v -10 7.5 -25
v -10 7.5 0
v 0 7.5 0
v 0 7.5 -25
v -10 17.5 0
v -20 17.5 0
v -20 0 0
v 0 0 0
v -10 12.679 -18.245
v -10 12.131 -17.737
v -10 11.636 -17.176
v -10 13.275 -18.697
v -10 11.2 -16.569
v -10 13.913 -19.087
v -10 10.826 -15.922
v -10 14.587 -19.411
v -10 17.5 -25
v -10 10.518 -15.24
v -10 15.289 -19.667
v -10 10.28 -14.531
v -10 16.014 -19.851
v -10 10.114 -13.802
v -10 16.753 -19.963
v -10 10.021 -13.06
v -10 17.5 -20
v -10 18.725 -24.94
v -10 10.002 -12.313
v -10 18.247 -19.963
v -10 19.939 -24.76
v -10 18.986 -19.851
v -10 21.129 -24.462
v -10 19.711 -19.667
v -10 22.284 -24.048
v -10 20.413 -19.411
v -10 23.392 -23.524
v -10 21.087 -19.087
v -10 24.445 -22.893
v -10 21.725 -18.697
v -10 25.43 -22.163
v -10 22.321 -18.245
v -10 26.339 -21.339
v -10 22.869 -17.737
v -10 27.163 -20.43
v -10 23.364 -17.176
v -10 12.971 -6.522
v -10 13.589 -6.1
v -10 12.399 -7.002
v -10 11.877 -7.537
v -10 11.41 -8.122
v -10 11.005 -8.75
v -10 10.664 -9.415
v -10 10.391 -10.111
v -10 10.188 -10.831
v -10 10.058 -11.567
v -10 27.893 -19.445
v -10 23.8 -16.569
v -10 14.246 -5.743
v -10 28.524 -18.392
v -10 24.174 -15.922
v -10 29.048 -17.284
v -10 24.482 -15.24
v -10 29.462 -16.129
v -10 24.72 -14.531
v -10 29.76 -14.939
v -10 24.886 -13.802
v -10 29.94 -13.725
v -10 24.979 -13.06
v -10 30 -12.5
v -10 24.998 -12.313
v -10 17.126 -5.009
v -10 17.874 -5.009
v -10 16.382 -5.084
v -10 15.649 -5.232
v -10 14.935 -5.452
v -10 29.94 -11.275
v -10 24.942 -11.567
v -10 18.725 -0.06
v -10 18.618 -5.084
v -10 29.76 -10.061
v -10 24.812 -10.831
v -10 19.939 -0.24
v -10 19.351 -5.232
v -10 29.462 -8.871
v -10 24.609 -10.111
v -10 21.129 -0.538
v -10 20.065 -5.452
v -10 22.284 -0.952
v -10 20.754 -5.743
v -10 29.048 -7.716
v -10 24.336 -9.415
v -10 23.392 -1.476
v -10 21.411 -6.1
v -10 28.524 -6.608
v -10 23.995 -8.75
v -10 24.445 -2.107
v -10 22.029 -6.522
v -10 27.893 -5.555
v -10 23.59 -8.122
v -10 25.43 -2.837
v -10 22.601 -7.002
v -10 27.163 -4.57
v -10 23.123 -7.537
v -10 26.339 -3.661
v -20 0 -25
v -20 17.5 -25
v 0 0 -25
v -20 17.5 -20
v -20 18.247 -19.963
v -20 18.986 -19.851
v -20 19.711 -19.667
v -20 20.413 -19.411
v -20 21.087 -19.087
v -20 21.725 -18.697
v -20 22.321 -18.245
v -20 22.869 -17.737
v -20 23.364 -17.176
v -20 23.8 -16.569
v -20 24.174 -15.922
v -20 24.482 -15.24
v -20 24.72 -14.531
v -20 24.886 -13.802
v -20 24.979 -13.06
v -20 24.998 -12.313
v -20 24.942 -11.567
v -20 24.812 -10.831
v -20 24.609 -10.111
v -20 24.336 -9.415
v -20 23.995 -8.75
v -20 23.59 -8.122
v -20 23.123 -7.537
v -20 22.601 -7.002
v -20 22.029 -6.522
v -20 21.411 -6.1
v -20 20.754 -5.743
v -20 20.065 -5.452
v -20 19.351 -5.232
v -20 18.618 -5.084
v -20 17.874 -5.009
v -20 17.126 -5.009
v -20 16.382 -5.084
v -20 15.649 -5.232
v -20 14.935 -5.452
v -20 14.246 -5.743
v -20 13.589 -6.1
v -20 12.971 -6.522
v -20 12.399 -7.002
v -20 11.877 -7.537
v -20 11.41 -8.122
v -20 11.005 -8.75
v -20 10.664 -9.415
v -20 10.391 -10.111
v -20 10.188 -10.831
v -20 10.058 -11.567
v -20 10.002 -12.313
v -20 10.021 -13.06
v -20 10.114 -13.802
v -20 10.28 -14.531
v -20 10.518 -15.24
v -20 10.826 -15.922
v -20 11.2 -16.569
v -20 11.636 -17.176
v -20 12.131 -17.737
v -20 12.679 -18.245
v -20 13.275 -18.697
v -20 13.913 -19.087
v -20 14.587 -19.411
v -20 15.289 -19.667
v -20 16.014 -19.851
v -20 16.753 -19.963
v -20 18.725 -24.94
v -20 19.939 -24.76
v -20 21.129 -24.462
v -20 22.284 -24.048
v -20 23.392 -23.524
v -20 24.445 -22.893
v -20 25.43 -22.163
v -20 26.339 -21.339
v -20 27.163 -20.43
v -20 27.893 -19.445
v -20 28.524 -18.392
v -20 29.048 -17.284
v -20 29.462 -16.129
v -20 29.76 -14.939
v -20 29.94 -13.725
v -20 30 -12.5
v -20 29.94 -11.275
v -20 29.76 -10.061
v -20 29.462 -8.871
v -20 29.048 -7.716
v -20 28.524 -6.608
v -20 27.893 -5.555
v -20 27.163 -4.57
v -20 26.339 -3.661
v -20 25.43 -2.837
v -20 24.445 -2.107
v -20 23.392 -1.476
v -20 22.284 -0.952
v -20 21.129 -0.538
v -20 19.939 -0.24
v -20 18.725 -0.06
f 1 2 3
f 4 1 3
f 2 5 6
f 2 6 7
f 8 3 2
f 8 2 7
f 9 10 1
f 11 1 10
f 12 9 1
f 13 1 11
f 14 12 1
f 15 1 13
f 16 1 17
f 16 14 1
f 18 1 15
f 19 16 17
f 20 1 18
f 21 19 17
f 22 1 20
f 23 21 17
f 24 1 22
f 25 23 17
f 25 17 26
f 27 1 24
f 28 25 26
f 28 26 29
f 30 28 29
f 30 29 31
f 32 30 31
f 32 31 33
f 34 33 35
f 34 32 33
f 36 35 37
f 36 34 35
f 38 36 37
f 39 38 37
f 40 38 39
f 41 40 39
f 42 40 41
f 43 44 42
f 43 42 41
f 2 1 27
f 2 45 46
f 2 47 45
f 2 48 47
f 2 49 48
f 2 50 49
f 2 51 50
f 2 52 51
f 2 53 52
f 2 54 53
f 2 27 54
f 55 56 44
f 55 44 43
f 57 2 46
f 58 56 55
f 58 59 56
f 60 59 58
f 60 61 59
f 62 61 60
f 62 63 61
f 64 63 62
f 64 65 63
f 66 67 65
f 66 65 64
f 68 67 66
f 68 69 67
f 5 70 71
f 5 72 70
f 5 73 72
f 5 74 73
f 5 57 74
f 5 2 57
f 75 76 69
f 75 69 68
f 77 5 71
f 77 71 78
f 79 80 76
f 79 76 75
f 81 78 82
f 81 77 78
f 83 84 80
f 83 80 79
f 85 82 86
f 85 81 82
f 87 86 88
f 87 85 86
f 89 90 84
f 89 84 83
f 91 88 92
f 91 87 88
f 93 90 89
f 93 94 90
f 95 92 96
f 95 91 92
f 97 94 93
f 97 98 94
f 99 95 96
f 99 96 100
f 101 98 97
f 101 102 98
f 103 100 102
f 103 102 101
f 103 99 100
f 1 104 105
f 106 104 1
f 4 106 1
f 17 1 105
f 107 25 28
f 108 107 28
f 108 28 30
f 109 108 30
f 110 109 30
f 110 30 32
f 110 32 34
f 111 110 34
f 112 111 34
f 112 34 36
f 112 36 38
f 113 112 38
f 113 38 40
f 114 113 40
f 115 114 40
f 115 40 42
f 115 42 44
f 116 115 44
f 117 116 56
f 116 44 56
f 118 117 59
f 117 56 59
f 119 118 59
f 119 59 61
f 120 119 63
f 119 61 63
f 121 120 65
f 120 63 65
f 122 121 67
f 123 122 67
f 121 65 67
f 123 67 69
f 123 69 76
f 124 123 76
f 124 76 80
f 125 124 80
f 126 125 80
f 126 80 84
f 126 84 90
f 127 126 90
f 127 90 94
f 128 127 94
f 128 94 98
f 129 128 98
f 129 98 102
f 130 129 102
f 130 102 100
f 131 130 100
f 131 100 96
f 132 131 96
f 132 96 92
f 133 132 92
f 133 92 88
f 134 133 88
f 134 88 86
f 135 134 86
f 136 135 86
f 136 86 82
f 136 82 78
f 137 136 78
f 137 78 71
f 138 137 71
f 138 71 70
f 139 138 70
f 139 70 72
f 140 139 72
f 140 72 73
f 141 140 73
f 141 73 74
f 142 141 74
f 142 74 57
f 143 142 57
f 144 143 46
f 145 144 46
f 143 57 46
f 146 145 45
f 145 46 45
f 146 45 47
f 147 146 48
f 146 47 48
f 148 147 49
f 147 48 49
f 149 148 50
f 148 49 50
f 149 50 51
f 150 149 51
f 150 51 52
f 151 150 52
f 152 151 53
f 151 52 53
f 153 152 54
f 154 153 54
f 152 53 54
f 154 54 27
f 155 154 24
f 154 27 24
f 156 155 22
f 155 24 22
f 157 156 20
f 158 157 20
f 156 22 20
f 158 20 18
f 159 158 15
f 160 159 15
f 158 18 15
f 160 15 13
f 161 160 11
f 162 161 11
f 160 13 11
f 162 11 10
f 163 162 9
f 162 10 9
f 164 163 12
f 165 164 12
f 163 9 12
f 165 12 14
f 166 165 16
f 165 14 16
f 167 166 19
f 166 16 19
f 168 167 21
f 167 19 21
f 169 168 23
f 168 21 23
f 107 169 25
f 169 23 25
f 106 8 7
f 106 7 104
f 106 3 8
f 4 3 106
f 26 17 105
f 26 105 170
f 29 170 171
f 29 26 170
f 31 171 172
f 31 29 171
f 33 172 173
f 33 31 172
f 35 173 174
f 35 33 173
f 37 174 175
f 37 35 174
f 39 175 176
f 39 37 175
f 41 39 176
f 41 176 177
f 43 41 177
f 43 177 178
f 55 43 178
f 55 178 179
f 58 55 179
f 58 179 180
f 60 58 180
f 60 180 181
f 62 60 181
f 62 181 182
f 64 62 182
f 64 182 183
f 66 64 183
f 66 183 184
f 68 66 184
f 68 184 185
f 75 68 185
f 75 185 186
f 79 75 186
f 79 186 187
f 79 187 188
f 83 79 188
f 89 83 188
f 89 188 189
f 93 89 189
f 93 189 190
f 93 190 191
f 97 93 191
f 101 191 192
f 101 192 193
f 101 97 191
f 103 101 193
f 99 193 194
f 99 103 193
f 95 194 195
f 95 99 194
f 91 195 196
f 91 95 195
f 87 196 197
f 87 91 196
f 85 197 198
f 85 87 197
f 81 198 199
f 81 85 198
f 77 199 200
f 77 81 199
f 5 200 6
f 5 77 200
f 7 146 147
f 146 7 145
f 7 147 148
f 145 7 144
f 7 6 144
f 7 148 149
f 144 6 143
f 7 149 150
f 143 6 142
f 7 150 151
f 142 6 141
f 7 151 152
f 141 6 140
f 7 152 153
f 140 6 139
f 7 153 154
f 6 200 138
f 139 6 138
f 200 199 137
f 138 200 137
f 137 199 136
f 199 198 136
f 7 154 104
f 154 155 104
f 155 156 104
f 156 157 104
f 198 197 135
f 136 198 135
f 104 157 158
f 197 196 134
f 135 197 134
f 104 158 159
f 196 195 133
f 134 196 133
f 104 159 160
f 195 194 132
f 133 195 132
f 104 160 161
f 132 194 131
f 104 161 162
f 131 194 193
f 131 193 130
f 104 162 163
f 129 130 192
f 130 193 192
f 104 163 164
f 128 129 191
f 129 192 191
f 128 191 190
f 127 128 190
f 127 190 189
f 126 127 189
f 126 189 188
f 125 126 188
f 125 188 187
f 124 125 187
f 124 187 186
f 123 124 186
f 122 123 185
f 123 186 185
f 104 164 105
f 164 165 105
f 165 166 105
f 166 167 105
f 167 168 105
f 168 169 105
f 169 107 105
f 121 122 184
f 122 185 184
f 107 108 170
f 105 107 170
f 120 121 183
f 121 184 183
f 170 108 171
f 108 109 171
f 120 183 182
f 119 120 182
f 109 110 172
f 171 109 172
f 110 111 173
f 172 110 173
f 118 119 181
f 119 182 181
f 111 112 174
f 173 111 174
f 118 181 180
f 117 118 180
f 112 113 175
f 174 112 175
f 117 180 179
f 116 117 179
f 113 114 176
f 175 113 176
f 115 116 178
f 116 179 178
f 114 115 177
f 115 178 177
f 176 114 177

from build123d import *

# Parameters (mm, degrees)
CROQUIS1_R              = 7.5
SALIENTE_EXTRUIR1_DEPTH = 20
CORTAR_EXTRUIR1_REACH   = 27
CROQUIS2_W              = 10
CROQUIS2_H              = 22.5


with BuildPart() as part:
    # Croquis1 → Saliente-Extruir1 (new body)
    with BuildSketch(Plane(origin=(0, 0, 0), x_dir=(0, 0, -1), z_dir=(1, 0, 0))):
        with BuildLine():
            Line((0, 0), (25, 0))
            Line((25, 0), (25, 17.5))
            ThreePointArc((25, 17.5), (12.5, 30), (0, 17.5))
            Line((0, 17.5), (0, 0))
        make_face()
        with Locations((12.5, 17.5)):
            Circle(CROQUIS1_R, mode=Mode.SUBTRACT)
    extrude(amount=-SALIENTE_EXTRUIR1_DEPTH)

    # Croquis2 → Cortar-Extruir1 (cut, up to next)
    with BuildSketch(Plane.XY, mode=Mode.PRIVATE) as cortar_extruir1_sk1:
        with Locations((-5, 18.75)):
            Rectangle(CROQUIS2_W, CROQUIS2_H)
    cortar_extruir1_tool1 = extrude(cortar_extruir1_sk1.sketch, amount=-CORTAR_EXTRUIR1_REACH, mode=Mode.PRIVATE) & part.part
    add(cortar_extruir1_tool1.solids().sort_by_distance((-5, 18.75, 0))[0], mode=Mode.SUBTRACT)


solid = part.part
